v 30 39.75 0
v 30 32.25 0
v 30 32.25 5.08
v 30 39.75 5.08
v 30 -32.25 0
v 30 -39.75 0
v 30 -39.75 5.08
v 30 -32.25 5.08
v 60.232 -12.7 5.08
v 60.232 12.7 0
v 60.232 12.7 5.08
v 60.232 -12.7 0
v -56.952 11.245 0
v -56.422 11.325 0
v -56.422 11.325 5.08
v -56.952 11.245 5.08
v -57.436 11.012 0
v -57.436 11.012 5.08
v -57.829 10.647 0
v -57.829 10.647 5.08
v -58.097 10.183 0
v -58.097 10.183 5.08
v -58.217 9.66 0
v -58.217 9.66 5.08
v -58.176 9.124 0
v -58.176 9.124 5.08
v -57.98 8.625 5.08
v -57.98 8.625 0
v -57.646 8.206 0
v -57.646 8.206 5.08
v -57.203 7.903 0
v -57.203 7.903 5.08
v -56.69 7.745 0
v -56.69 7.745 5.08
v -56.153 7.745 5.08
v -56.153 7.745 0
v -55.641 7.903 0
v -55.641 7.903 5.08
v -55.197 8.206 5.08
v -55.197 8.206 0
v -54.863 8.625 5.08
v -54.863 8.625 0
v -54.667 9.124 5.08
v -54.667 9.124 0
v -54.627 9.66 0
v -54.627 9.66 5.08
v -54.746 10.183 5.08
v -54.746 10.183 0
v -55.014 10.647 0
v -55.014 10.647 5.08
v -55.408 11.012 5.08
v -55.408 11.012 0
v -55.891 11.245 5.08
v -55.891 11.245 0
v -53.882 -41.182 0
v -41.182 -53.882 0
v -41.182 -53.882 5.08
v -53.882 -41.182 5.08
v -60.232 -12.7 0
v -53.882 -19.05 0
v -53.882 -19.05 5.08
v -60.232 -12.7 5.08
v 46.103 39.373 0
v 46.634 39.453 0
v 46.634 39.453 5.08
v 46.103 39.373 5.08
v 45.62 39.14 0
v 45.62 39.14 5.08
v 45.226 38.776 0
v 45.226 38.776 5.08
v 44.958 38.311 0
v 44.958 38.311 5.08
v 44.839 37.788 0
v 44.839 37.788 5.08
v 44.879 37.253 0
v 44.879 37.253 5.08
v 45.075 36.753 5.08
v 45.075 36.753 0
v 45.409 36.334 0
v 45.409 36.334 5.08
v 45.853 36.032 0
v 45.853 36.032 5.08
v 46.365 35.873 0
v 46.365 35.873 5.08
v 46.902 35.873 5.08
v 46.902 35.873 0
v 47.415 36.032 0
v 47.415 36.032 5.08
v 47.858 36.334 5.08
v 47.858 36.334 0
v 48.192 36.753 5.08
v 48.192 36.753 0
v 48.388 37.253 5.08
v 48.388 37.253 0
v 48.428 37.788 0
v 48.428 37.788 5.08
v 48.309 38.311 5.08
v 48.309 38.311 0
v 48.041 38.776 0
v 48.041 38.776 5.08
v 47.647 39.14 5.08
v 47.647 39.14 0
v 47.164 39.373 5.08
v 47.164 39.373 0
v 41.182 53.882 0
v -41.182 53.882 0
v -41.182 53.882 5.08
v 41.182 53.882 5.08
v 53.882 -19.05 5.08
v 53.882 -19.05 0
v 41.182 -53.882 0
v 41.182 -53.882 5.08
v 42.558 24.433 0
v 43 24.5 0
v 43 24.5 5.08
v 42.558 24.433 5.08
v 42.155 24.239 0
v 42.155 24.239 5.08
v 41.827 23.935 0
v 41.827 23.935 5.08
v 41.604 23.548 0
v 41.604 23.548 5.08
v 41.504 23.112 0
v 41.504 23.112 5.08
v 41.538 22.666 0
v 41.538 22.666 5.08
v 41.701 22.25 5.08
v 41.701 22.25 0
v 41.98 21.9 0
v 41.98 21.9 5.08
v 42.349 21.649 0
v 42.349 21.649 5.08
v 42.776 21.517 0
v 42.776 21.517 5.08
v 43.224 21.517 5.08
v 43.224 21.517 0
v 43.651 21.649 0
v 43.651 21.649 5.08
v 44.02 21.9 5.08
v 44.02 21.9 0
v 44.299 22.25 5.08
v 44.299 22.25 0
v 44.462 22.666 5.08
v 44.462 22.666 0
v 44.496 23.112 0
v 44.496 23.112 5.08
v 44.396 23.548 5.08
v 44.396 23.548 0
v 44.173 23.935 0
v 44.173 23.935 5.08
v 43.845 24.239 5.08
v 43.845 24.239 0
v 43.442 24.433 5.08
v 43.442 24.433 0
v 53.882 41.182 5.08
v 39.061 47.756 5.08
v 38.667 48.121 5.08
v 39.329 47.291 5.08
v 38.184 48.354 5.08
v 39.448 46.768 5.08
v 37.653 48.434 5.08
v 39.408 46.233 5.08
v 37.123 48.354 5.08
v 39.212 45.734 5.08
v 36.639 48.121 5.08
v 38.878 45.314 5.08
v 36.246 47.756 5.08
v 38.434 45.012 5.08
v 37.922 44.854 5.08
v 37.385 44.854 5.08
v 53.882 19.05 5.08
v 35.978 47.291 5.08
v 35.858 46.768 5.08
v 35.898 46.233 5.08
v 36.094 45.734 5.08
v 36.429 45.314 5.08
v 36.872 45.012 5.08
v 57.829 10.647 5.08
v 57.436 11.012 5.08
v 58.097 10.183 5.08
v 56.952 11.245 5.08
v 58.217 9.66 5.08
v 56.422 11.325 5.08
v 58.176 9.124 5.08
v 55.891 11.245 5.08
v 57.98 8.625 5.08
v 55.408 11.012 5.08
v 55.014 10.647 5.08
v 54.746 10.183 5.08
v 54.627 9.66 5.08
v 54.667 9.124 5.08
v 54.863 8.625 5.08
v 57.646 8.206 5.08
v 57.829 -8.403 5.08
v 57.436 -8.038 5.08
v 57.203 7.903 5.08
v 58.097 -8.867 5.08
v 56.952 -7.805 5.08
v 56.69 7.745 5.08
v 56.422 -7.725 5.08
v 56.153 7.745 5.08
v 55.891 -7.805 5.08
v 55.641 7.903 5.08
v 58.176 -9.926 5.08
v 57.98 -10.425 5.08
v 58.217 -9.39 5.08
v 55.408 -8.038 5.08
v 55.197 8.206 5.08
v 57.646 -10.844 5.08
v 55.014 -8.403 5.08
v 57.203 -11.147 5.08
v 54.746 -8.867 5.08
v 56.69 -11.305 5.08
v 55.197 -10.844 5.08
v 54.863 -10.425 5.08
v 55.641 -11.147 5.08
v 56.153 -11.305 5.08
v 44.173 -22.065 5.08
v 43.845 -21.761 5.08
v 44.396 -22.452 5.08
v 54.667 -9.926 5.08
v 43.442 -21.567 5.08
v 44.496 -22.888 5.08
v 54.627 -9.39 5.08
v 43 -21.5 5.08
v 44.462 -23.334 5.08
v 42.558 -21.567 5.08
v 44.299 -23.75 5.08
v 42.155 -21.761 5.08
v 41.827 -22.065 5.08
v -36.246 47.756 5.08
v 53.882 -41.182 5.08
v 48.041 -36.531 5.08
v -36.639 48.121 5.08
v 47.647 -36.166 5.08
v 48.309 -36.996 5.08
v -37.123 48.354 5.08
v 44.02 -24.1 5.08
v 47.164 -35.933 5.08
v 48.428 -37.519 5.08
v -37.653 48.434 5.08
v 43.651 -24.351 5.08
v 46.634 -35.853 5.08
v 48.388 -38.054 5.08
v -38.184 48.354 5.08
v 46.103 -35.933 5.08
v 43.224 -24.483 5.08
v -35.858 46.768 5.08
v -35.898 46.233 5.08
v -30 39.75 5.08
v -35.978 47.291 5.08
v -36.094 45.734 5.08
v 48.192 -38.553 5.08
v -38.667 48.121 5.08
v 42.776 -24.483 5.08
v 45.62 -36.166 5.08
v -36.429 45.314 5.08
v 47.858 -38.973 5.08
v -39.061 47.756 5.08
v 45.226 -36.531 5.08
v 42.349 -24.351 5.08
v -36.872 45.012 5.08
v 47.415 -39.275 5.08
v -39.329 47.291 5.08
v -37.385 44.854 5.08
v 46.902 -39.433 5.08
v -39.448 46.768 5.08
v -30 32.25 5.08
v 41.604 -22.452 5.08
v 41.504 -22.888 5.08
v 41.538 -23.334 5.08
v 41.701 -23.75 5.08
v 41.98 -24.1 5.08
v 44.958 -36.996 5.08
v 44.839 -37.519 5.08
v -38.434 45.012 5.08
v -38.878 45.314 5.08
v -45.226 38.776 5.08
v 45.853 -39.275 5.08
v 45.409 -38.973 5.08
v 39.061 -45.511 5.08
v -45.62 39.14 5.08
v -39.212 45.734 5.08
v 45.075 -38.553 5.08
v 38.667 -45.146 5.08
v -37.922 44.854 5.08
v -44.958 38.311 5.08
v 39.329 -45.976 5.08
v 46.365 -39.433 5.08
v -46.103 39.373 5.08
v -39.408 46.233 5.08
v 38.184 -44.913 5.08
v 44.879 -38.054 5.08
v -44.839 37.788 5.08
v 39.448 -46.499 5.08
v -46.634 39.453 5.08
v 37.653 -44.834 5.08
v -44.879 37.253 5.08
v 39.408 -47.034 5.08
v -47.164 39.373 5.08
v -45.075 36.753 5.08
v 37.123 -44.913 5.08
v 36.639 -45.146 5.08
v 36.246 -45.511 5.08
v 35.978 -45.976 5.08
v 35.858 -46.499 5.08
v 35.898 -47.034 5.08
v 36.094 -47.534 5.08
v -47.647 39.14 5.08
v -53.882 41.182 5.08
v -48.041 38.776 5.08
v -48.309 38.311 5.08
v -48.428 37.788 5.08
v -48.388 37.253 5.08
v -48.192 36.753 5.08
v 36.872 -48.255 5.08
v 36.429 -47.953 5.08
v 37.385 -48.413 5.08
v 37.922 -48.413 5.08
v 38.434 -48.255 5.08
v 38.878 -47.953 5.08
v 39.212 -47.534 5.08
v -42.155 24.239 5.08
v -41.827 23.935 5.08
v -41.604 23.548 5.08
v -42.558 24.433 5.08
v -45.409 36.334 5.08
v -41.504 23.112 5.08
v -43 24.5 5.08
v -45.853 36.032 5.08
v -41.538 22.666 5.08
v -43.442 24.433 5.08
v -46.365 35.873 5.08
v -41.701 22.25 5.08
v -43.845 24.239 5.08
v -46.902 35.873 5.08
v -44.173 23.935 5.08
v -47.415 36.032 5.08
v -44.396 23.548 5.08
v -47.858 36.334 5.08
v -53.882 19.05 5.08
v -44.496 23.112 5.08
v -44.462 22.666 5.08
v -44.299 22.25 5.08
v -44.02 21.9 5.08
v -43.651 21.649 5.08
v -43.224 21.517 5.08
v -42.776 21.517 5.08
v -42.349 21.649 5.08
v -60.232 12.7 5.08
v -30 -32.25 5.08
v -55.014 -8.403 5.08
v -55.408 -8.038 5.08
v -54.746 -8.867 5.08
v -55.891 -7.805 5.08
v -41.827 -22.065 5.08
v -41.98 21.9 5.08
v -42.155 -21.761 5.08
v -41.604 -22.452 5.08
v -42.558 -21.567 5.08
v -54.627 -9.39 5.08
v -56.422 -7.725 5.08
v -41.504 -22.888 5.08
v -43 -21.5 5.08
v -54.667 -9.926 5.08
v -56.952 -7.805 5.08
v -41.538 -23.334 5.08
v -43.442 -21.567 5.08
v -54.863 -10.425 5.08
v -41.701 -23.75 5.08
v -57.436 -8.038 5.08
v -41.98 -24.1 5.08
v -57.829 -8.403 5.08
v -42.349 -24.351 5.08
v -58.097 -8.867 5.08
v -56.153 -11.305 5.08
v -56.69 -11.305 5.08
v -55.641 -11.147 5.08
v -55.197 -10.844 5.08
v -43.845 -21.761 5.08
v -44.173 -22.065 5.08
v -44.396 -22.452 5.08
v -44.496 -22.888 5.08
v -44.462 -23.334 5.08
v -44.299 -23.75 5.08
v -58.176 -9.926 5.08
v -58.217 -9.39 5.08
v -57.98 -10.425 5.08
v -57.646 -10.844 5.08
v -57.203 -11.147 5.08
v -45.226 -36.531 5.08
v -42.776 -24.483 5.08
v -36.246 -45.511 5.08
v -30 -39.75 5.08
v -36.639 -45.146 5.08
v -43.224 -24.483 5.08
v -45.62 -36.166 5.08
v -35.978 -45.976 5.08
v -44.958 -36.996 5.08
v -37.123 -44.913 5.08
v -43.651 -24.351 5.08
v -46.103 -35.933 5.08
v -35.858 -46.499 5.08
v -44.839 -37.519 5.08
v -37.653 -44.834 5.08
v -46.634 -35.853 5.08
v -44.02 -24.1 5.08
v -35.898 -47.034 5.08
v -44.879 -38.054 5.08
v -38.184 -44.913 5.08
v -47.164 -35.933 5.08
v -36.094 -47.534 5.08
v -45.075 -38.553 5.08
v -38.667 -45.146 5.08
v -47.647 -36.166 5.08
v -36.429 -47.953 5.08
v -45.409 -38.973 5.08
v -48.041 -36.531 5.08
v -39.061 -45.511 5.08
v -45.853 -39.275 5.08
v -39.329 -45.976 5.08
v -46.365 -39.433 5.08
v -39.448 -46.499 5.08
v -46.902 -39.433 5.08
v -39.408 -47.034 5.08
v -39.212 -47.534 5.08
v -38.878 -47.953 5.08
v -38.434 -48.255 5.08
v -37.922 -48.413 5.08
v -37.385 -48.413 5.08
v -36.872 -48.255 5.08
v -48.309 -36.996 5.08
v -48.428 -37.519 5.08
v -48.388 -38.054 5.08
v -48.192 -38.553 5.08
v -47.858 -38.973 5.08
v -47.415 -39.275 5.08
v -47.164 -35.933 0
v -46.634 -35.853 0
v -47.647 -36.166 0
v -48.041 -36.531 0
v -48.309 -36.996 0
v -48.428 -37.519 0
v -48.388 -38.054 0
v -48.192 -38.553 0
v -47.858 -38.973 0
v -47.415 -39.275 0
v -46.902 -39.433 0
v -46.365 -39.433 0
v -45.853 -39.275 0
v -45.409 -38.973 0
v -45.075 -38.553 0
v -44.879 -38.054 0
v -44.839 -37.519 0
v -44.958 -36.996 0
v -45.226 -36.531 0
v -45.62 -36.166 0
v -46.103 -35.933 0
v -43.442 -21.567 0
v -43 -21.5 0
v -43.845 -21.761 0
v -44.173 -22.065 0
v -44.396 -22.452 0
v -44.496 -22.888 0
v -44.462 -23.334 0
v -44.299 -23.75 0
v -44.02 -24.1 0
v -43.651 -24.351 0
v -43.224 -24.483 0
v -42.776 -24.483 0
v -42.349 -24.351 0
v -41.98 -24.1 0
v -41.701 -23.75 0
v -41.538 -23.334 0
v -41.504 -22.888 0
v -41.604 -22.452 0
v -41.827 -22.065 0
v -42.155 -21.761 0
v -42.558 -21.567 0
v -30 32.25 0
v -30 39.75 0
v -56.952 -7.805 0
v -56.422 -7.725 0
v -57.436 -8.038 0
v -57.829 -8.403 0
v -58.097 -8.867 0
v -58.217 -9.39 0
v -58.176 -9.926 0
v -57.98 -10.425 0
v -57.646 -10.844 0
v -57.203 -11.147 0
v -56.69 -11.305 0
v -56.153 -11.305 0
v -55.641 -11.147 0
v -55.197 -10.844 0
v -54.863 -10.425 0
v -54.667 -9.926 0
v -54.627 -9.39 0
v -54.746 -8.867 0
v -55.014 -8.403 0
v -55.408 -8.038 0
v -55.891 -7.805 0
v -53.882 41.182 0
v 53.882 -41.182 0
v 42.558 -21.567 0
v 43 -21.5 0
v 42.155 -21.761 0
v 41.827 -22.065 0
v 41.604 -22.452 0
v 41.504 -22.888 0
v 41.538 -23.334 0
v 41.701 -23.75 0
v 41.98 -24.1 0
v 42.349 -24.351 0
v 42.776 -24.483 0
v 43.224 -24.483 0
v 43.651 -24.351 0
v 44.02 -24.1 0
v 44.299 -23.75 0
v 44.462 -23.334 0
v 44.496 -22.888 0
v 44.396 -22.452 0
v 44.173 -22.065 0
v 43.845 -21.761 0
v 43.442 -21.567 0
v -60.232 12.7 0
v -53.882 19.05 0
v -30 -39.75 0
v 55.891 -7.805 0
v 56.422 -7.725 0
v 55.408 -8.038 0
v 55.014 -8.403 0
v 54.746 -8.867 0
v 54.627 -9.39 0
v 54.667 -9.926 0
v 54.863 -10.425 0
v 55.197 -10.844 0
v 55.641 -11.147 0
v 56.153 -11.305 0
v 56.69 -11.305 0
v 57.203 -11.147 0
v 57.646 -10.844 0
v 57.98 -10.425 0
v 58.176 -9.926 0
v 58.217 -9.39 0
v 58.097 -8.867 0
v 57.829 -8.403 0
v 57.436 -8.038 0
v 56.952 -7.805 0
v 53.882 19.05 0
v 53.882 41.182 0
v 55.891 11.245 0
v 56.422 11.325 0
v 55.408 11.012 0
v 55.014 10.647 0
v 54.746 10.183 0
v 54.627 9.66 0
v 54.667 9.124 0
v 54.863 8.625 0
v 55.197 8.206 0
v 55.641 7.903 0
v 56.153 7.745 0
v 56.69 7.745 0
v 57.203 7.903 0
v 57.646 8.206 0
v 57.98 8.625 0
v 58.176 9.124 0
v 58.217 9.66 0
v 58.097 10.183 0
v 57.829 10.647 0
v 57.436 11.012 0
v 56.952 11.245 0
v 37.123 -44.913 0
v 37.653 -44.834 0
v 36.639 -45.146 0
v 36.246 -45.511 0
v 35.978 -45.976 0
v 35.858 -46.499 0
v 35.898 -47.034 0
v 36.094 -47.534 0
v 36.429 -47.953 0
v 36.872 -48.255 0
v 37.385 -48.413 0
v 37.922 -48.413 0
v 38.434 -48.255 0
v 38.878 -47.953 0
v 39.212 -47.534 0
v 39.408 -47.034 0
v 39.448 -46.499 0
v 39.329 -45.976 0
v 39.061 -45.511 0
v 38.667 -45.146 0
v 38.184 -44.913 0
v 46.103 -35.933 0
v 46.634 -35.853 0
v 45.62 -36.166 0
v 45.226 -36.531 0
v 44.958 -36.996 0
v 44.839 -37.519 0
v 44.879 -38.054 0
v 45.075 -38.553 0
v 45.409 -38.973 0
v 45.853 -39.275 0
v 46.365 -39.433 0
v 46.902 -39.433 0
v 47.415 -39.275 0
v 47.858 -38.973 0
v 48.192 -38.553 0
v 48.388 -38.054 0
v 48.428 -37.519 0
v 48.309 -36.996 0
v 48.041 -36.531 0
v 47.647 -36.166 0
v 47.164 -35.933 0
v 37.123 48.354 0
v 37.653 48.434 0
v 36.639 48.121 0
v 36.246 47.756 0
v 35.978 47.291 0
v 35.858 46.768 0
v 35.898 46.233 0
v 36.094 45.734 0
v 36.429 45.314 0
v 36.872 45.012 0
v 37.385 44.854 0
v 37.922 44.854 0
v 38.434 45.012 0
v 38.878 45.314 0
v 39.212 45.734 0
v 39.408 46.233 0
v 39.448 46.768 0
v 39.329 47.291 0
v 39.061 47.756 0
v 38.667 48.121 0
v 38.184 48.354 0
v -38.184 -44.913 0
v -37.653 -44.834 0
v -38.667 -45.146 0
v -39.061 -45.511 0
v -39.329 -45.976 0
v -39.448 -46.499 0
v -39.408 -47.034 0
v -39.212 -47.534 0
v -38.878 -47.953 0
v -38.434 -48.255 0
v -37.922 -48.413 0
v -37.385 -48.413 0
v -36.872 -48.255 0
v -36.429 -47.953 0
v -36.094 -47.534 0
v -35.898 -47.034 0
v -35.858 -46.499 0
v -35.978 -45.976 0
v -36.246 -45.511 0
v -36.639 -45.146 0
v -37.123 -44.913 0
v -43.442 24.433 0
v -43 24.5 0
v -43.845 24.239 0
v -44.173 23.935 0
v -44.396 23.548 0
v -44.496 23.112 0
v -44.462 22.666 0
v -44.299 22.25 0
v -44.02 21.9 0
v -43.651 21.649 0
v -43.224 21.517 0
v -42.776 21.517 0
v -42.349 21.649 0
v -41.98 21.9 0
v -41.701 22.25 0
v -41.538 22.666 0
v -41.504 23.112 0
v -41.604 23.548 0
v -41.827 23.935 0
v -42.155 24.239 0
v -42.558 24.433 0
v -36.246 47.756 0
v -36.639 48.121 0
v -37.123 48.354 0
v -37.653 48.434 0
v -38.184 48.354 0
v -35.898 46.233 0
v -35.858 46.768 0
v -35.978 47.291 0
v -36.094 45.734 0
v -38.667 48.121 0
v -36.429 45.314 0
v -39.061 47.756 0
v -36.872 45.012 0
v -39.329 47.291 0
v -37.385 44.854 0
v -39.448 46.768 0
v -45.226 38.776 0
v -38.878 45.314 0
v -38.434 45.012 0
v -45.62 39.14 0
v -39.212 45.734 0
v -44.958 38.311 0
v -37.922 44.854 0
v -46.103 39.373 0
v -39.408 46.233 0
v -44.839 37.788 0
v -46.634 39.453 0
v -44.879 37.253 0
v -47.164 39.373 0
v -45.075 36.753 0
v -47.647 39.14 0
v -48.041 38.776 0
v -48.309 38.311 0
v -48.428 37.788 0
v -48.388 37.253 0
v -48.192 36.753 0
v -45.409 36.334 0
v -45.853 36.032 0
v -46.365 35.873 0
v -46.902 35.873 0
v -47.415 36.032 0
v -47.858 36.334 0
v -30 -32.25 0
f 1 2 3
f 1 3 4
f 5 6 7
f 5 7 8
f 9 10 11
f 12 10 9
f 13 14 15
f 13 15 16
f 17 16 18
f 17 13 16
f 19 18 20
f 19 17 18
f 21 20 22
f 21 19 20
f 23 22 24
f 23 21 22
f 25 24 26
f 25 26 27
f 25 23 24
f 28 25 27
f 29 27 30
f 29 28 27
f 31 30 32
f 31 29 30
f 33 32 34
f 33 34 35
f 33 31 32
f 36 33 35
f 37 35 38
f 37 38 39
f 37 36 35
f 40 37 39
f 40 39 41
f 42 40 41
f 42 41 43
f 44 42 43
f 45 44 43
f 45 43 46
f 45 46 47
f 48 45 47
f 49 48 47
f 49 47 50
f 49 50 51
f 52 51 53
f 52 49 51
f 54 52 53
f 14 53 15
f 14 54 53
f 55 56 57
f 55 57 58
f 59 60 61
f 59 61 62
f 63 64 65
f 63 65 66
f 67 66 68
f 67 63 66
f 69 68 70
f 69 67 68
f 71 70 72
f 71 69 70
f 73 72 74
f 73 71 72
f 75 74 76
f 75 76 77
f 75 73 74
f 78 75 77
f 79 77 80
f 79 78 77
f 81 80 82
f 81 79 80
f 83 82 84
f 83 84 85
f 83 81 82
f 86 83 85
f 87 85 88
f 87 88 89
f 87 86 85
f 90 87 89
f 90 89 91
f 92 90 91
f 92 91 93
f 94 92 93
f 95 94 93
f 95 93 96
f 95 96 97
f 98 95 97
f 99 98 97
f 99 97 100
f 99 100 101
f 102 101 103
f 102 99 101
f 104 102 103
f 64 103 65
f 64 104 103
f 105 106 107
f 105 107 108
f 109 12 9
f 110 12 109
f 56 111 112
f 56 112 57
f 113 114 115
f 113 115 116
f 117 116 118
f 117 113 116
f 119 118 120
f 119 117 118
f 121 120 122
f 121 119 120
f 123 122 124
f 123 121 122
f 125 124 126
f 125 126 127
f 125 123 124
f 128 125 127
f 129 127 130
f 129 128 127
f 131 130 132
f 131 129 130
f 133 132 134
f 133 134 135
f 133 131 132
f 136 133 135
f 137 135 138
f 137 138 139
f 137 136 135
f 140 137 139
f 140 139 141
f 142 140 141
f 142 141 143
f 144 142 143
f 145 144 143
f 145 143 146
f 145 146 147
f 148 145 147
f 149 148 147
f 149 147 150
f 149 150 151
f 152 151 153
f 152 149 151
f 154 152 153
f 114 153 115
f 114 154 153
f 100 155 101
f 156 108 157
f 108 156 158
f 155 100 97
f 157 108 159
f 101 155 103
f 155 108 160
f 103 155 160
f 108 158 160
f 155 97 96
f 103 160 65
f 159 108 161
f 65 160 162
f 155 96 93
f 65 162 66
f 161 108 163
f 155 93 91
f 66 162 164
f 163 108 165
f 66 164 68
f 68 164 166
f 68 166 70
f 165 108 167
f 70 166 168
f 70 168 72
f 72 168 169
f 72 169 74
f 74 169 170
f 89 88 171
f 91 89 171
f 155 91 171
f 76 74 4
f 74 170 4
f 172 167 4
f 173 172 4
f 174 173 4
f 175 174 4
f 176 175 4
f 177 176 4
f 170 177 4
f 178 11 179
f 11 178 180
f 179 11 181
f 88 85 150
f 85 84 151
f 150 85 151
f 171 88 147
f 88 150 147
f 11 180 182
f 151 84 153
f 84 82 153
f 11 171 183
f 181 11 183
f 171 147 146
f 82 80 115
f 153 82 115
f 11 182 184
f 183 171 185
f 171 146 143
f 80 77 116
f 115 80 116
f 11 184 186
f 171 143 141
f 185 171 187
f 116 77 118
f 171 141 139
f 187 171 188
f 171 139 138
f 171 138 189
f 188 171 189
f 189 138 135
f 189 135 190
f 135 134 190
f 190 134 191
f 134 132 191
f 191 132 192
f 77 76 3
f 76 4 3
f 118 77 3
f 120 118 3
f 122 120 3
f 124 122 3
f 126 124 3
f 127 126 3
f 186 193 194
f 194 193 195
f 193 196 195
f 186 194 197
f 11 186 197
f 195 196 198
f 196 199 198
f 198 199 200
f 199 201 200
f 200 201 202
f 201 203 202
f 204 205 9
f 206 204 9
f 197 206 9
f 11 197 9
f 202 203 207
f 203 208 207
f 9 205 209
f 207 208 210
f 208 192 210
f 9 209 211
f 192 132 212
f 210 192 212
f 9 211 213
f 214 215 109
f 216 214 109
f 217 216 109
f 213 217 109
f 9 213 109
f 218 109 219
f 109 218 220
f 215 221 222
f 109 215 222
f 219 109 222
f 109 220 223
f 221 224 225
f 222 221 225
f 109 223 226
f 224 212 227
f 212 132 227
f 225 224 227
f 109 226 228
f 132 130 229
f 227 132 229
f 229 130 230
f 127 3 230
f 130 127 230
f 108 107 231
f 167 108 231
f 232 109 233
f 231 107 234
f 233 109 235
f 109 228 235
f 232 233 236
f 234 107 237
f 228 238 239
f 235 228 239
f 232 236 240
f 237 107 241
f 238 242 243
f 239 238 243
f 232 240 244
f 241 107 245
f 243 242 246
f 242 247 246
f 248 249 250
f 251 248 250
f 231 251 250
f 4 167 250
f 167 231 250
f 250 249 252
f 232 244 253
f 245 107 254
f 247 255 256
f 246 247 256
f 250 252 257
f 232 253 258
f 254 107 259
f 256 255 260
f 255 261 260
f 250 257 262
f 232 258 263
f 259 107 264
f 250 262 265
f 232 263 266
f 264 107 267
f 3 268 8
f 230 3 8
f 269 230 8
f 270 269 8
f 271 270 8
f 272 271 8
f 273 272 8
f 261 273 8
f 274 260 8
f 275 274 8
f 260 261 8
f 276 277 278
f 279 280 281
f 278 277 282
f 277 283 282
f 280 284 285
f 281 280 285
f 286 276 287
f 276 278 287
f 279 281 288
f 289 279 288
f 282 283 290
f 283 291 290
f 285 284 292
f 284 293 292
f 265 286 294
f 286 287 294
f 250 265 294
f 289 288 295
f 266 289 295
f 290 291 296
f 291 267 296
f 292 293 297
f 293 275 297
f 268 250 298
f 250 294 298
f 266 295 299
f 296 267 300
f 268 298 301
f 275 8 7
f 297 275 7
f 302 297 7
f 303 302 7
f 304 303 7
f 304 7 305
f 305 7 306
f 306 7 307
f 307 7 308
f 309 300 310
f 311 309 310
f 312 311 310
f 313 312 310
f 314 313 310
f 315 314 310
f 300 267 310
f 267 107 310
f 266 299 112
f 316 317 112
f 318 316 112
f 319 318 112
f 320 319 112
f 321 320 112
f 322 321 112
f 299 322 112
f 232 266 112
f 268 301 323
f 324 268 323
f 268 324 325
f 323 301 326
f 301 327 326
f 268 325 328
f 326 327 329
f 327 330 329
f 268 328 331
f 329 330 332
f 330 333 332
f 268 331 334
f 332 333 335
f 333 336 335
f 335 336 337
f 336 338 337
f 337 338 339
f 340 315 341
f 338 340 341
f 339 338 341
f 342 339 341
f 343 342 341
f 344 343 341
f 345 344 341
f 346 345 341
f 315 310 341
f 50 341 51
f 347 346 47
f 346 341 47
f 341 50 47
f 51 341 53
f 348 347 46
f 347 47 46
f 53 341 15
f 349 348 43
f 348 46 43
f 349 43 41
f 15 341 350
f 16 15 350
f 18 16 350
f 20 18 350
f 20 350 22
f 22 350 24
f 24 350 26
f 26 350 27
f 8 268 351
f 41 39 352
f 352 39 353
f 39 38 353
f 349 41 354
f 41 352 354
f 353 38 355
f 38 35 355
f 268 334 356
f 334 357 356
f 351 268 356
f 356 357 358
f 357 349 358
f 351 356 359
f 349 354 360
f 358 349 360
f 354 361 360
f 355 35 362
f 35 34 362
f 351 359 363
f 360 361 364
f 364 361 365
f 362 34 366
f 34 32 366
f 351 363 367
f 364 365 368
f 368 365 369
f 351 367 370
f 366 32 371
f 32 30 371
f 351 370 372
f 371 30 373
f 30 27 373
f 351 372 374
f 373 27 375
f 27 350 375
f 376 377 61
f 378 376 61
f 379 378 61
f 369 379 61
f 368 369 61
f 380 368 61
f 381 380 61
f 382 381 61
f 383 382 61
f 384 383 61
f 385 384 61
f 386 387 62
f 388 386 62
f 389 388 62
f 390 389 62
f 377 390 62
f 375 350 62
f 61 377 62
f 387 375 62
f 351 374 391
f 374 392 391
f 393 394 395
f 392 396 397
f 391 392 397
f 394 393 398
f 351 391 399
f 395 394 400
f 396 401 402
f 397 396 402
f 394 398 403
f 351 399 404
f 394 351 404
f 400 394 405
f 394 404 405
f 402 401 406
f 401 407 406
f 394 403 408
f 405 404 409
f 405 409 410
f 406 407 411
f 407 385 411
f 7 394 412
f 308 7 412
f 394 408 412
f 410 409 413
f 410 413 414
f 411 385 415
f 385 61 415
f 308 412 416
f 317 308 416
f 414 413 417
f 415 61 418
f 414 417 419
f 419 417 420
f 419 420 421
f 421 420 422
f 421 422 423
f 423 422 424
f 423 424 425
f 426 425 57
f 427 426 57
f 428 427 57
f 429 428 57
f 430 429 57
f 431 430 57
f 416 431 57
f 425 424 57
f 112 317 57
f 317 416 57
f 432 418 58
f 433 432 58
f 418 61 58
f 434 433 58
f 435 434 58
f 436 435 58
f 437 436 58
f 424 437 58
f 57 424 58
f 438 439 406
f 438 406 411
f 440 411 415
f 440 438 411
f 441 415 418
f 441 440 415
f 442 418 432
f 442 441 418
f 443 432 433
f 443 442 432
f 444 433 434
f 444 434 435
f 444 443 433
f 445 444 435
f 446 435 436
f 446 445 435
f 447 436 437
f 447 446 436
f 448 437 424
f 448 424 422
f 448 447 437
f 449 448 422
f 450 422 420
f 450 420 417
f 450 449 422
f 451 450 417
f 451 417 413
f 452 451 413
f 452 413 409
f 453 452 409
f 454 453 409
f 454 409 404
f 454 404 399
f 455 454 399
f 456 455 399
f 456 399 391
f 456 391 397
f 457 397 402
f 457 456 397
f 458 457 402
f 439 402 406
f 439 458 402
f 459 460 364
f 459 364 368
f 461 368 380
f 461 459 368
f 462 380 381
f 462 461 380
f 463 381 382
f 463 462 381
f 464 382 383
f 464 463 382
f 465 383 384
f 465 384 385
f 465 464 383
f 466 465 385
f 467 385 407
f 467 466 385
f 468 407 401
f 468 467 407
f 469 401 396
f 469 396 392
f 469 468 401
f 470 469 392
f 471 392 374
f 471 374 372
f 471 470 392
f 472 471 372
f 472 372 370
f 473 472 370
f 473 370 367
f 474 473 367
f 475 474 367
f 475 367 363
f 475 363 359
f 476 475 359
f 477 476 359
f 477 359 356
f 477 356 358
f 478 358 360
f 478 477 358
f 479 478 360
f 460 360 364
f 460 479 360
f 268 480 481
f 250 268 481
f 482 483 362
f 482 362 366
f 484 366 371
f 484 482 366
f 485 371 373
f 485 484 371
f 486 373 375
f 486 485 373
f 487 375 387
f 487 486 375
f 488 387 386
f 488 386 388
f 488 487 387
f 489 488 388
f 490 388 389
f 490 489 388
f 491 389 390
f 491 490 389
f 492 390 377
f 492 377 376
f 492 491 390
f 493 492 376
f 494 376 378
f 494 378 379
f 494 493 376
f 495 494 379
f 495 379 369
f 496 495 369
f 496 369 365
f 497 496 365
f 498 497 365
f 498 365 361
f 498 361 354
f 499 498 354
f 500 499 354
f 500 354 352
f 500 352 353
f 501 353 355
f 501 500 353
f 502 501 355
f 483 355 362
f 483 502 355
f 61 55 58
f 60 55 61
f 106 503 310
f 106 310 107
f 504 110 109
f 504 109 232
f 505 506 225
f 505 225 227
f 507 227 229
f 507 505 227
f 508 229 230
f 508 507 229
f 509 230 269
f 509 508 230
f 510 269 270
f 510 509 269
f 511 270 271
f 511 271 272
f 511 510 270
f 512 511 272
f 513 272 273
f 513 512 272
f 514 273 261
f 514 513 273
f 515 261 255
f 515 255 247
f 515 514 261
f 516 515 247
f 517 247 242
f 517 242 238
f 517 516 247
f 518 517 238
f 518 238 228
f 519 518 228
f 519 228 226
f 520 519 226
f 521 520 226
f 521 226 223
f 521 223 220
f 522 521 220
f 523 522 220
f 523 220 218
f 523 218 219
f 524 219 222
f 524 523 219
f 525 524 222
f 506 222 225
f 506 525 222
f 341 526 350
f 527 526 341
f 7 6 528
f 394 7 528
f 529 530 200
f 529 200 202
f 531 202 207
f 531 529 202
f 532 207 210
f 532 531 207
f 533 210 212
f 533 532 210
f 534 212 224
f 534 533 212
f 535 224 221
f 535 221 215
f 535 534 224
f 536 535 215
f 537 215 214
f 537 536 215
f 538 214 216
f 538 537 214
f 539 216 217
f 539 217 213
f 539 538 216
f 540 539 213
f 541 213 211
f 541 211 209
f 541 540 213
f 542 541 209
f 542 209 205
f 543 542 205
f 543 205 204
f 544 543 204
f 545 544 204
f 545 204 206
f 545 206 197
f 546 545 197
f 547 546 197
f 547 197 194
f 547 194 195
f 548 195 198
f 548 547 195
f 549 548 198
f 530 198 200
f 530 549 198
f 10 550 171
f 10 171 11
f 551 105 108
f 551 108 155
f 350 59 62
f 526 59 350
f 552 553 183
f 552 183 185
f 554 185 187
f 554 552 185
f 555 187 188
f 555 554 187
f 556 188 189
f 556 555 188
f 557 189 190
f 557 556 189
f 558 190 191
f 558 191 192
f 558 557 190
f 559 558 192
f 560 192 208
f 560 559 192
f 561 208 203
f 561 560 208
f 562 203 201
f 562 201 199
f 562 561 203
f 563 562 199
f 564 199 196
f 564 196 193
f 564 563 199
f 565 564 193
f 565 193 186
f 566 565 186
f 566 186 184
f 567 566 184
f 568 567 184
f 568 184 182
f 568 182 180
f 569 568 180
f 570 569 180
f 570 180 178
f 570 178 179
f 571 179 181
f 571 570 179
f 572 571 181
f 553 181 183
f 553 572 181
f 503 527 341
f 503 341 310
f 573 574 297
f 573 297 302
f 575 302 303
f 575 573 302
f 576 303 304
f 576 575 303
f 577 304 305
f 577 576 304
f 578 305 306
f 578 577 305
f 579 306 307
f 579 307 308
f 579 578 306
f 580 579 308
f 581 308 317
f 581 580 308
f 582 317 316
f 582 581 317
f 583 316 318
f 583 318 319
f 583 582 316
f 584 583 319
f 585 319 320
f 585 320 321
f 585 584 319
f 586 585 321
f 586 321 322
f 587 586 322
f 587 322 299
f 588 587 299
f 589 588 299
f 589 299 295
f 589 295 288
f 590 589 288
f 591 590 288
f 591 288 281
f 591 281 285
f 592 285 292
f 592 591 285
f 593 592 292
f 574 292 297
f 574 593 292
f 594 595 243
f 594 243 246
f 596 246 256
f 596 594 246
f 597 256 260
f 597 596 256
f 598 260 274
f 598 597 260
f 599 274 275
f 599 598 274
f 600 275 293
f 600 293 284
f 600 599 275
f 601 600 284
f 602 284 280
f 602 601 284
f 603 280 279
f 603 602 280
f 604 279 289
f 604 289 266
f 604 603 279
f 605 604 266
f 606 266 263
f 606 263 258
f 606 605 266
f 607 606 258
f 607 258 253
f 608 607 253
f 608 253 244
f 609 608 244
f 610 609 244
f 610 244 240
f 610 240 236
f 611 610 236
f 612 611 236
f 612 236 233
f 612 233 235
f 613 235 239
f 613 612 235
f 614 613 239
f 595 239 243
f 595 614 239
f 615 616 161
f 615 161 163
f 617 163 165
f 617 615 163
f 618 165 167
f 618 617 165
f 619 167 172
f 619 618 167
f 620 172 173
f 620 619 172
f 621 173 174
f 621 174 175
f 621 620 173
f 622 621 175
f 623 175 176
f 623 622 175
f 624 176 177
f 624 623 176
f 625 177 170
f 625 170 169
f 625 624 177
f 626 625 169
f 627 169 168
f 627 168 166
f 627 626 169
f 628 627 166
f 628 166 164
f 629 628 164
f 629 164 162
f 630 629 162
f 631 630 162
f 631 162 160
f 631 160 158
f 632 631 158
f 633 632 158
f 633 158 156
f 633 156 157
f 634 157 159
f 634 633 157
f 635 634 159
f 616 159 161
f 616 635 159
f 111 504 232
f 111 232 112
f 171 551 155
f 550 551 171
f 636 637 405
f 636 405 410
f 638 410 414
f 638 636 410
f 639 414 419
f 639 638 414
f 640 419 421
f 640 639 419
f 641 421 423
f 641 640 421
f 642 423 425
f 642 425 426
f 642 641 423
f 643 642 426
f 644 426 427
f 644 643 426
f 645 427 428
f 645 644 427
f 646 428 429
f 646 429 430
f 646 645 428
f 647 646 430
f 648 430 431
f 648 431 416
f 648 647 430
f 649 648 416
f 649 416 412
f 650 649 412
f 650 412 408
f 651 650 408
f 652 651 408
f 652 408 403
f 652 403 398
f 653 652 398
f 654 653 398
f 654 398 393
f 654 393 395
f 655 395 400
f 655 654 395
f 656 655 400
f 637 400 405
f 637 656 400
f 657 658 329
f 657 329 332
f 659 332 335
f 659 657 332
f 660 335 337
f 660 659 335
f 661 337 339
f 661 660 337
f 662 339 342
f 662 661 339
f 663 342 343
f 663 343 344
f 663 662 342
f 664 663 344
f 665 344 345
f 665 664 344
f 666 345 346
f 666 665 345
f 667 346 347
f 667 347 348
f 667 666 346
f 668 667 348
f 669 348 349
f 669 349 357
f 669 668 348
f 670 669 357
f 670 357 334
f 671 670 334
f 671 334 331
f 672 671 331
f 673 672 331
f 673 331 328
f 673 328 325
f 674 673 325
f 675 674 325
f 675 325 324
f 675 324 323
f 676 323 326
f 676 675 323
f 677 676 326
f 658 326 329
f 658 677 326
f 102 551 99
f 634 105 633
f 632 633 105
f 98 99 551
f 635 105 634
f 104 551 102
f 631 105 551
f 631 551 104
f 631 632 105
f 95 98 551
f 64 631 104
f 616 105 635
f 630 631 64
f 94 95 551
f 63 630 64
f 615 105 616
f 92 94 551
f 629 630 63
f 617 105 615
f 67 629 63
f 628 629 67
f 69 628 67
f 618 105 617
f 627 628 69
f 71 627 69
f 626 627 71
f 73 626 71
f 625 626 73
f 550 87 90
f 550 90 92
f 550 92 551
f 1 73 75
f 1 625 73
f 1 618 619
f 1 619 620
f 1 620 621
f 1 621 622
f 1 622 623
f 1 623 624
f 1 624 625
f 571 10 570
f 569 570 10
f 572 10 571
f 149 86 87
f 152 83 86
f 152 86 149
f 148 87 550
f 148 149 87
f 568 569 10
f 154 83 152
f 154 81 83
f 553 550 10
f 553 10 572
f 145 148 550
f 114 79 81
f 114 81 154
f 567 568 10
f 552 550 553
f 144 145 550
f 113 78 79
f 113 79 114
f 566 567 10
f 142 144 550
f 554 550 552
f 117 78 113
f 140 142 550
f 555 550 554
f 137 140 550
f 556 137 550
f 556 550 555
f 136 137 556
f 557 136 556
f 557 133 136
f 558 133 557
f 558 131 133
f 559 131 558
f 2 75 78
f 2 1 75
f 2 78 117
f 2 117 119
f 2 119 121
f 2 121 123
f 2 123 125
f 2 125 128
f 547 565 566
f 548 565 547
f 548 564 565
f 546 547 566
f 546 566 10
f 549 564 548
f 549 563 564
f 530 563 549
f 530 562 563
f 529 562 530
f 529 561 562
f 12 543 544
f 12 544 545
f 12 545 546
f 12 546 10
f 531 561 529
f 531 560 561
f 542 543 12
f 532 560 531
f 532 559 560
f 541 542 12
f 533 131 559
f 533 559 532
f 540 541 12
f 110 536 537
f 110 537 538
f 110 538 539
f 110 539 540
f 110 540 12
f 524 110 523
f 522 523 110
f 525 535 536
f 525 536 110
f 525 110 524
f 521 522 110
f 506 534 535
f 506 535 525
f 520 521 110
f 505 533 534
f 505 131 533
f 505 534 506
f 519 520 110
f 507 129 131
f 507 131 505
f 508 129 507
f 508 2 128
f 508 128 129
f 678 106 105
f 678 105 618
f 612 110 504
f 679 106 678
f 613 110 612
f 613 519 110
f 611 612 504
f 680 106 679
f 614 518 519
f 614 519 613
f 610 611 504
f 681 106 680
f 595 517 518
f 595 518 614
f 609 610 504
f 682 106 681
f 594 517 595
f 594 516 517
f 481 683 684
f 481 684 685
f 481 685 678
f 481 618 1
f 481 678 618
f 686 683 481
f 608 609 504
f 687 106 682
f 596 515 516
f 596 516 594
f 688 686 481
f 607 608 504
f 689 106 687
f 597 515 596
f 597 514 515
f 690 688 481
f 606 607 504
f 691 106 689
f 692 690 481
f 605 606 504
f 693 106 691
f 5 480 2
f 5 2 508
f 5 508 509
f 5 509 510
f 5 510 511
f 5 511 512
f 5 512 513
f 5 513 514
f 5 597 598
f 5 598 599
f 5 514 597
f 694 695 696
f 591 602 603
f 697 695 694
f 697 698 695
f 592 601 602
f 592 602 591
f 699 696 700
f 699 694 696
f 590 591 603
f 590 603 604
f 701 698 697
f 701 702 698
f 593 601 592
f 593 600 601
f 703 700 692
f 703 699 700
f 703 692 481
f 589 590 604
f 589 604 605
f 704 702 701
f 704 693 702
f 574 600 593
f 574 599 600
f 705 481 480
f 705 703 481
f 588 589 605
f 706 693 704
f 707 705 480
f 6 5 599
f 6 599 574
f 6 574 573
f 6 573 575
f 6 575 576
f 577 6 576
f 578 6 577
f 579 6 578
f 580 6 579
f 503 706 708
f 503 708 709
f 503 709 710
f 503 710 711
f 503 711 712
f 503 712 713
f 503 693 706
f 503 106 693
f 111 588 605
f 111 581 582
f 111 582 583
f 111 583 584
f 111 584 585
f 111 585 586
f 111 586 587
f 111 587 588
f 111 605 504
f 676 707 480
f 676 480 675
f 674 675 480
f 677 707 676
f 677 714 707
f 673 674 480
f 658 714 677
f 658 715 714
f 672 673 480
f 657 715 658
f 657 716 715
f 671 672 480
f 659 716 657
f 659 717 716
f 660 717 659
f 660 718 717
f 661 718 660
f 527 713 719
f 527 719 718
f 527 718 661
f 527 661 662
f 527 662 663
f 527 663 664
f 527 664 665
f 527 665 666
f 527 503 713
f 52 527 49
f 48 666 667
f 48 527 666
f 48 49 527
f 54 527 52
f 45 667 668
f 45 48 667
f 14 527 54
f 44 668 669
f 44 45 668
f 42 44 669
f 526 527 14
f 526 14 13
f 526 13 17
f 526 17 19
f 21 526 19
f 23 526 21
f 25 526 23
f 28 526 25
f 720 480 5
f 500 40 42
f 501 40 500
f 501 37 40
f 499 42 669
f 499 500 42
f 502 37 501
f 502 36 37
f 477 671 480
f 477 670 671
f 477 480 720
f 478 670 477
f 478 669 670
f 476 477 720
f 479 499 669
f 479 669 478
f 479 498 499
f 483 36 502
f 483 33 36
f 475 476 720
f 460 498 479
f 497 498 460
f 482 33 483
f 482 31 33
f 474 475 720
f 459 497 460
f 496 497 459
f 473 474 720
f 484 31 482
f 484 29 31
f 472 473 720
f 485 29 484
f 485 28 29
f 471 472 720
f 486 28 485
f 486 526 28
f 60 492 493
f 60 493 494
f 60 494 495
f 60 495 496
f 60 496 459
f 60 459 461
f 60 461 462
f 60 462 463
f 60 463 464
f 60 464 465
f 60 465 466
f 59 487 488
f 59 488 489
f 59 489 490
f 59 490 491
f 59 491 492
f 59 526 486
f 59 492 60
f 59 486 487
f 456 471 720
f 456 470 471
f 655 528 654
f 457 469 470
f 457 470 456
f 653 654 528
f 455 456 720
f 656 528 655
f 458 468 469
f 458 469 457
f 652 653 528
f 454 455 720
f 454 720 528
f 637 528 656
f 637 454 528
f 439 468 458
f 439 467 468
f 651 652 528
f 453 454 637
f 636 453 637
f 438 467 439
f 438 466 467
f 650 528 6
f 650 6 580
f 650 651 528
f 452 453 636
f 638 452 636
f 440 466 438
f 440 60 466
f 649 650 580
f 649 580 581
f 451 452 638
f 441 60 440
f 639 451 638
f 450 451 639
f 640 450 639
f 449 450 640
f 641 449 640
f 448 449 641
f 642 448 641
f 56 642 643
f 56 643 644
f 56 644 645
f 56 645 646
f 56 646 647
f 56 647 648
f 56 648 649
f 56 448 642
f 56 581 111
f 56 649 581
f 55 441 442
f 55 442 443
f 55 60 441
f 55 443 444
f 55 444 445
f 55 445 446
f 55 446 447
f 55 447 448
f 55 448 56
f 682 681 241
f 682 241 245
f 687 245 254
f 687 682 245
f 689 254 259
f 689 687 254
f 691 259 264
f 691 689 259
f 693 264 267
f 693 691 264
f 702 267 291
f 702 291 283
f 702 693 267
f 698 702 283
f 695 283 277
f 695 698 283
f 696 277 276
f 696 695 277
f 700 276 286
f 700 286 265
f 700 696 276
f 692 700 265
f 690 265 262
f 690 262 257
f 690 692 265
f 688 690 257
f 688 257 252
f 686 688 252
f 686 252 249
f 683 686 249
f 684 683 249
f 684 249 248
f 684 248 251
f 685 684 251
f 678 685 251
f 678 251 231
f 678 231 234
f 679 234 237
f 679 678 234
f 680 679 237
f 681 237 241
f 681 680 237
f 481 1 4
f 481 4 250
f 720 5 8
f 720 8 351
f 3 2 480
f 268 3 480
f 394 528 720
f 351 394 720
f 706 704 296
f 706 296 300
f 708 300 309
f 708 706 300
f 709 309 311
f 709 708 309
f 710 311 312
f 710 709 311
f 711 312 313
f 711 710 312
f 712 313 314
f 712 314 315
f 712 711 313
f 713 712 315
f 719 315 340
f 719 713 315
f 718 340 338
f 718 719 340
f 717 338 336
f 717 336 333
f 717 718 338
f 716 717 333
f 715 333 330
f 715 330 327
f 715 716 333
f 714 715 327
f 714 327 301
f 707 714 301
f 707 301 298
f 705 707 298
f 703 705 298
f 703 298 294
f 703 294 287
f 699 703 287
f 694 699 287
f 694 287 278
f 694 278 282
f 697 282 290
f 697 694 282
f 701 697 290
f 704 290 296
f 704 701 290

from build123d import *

# Parameters (mm, degrees)
SKETCH1_R           = 1.8
SKETCH1_R_2         = 1.5
SKETCH1_W           = 7.5
SKETCH1_H           = 60
BOSS_EXTRUDE1_DEPTH = 5.08


with BuildPart() as part:
    # Sketch1 → Boss-Extrude1 (new body)
    with BuildSketch(Plane(origin=(0, 0, 0), x_dir=(0, 1, 0), z_dir=(0, 0, 1))):
        Polygon((-41.181536726, 53.881536726), (-19.05, 53.881536726), (-12.7, 60.231536726), (12.7, 60.231536726), (19.05, 53.881536726), (41.181536726, 53.881536726), (53.881536726, 41.181536726), (53.881536726, -41.181536726), (41.181536726, -53.881536726), (19.05, -53.881536726), (12.7, -60.231536726), (-12.7, -60.231536726), (-19.05, -53.881536726), (-41.181536726, -53.881536726), (-53.881536726, -41.181536726), (-53.881536726, 41.181536726), align=None)
        with Locations((-46.633511114, -37.653254993)):
            Circle(SKETCH1_R, mode=Mode.SUBTRACT)
        with Locations((-37.653254993, -46.633511114)):
            Circle(SKETCH1_R, mode=Mode.SUBTRACT)
        with Locations((46.633511114, -37.653254993)):
            Circle(SKETCH1_R, mode=Mode.SUBTRACT)
        with Locations((37.653254993, -46.633511114)):
            Circle(SKETCH1_R, mode=Mode.SUBTRACT)
        with Locations((-46.633511114, 37.653254993)):
            Circle(SKETCH1_R, mode=Mode.SUBTRACT)
        with Locations((-37.653254993, 46.633511114)):
            Circle(SKETCH1_R, mode=Mode.SUBTRACT)
        with Locations((37.653254993, 46.633511114)):
            Circle(SKETCH1_R, mode=Mode.SUBTRACT)
        with Locations((46.633511114, 37.653254993)):
            Circle(SKETCH1_R, mode=Mode.SUBTRACT)
        with Locations((-23, 43)):
            Circle(SKETCH1_R_2, mode=Mode.SUBTRACT)
        with Locations((23, 43)):
            Circle(SKETCH1_R_2, mode=Mode.SUBTRACT)
        with Locations((-23, -43)):
            Circle(SKETCH1_R_2, mode=Mode.SUBTRACT)
        with Locations((23, -43)):
            Circle(SKETCH1_R_2, mode=Mode.SUBTRACT)
        with Locations((9.525, -56.421536726)):
            Circle(SKETCH1_R, mode=Mode.SUBTRACT)
        with Locations((-9.525, -56.421536726)):
            Circle(SKETCH1_R, mode=Mode.SUBTRACT)
        with Locations((-9.525, 56.421536726)):
            Circle(SKETCH1_R, mode=Mode.SUBTRACT)
        with Locations((9.525, 56.421536726)):
            Circle(SKETCH1_R, mode=Mode.SUBTRACT)
        with Locations((-36, 0)):
            Rectangle(SKETCH1_W, SKETCH1_H, mode=Mode.SUBTRACT)
        with Locations((36, 0)):
            Rectangle(SKETCH1_W, SKETCH1_H, mode=Mode.SUBTRACT)
    extrude(amount=BOSS_EXTRUDE1_DEPTH)


solid = part.part
